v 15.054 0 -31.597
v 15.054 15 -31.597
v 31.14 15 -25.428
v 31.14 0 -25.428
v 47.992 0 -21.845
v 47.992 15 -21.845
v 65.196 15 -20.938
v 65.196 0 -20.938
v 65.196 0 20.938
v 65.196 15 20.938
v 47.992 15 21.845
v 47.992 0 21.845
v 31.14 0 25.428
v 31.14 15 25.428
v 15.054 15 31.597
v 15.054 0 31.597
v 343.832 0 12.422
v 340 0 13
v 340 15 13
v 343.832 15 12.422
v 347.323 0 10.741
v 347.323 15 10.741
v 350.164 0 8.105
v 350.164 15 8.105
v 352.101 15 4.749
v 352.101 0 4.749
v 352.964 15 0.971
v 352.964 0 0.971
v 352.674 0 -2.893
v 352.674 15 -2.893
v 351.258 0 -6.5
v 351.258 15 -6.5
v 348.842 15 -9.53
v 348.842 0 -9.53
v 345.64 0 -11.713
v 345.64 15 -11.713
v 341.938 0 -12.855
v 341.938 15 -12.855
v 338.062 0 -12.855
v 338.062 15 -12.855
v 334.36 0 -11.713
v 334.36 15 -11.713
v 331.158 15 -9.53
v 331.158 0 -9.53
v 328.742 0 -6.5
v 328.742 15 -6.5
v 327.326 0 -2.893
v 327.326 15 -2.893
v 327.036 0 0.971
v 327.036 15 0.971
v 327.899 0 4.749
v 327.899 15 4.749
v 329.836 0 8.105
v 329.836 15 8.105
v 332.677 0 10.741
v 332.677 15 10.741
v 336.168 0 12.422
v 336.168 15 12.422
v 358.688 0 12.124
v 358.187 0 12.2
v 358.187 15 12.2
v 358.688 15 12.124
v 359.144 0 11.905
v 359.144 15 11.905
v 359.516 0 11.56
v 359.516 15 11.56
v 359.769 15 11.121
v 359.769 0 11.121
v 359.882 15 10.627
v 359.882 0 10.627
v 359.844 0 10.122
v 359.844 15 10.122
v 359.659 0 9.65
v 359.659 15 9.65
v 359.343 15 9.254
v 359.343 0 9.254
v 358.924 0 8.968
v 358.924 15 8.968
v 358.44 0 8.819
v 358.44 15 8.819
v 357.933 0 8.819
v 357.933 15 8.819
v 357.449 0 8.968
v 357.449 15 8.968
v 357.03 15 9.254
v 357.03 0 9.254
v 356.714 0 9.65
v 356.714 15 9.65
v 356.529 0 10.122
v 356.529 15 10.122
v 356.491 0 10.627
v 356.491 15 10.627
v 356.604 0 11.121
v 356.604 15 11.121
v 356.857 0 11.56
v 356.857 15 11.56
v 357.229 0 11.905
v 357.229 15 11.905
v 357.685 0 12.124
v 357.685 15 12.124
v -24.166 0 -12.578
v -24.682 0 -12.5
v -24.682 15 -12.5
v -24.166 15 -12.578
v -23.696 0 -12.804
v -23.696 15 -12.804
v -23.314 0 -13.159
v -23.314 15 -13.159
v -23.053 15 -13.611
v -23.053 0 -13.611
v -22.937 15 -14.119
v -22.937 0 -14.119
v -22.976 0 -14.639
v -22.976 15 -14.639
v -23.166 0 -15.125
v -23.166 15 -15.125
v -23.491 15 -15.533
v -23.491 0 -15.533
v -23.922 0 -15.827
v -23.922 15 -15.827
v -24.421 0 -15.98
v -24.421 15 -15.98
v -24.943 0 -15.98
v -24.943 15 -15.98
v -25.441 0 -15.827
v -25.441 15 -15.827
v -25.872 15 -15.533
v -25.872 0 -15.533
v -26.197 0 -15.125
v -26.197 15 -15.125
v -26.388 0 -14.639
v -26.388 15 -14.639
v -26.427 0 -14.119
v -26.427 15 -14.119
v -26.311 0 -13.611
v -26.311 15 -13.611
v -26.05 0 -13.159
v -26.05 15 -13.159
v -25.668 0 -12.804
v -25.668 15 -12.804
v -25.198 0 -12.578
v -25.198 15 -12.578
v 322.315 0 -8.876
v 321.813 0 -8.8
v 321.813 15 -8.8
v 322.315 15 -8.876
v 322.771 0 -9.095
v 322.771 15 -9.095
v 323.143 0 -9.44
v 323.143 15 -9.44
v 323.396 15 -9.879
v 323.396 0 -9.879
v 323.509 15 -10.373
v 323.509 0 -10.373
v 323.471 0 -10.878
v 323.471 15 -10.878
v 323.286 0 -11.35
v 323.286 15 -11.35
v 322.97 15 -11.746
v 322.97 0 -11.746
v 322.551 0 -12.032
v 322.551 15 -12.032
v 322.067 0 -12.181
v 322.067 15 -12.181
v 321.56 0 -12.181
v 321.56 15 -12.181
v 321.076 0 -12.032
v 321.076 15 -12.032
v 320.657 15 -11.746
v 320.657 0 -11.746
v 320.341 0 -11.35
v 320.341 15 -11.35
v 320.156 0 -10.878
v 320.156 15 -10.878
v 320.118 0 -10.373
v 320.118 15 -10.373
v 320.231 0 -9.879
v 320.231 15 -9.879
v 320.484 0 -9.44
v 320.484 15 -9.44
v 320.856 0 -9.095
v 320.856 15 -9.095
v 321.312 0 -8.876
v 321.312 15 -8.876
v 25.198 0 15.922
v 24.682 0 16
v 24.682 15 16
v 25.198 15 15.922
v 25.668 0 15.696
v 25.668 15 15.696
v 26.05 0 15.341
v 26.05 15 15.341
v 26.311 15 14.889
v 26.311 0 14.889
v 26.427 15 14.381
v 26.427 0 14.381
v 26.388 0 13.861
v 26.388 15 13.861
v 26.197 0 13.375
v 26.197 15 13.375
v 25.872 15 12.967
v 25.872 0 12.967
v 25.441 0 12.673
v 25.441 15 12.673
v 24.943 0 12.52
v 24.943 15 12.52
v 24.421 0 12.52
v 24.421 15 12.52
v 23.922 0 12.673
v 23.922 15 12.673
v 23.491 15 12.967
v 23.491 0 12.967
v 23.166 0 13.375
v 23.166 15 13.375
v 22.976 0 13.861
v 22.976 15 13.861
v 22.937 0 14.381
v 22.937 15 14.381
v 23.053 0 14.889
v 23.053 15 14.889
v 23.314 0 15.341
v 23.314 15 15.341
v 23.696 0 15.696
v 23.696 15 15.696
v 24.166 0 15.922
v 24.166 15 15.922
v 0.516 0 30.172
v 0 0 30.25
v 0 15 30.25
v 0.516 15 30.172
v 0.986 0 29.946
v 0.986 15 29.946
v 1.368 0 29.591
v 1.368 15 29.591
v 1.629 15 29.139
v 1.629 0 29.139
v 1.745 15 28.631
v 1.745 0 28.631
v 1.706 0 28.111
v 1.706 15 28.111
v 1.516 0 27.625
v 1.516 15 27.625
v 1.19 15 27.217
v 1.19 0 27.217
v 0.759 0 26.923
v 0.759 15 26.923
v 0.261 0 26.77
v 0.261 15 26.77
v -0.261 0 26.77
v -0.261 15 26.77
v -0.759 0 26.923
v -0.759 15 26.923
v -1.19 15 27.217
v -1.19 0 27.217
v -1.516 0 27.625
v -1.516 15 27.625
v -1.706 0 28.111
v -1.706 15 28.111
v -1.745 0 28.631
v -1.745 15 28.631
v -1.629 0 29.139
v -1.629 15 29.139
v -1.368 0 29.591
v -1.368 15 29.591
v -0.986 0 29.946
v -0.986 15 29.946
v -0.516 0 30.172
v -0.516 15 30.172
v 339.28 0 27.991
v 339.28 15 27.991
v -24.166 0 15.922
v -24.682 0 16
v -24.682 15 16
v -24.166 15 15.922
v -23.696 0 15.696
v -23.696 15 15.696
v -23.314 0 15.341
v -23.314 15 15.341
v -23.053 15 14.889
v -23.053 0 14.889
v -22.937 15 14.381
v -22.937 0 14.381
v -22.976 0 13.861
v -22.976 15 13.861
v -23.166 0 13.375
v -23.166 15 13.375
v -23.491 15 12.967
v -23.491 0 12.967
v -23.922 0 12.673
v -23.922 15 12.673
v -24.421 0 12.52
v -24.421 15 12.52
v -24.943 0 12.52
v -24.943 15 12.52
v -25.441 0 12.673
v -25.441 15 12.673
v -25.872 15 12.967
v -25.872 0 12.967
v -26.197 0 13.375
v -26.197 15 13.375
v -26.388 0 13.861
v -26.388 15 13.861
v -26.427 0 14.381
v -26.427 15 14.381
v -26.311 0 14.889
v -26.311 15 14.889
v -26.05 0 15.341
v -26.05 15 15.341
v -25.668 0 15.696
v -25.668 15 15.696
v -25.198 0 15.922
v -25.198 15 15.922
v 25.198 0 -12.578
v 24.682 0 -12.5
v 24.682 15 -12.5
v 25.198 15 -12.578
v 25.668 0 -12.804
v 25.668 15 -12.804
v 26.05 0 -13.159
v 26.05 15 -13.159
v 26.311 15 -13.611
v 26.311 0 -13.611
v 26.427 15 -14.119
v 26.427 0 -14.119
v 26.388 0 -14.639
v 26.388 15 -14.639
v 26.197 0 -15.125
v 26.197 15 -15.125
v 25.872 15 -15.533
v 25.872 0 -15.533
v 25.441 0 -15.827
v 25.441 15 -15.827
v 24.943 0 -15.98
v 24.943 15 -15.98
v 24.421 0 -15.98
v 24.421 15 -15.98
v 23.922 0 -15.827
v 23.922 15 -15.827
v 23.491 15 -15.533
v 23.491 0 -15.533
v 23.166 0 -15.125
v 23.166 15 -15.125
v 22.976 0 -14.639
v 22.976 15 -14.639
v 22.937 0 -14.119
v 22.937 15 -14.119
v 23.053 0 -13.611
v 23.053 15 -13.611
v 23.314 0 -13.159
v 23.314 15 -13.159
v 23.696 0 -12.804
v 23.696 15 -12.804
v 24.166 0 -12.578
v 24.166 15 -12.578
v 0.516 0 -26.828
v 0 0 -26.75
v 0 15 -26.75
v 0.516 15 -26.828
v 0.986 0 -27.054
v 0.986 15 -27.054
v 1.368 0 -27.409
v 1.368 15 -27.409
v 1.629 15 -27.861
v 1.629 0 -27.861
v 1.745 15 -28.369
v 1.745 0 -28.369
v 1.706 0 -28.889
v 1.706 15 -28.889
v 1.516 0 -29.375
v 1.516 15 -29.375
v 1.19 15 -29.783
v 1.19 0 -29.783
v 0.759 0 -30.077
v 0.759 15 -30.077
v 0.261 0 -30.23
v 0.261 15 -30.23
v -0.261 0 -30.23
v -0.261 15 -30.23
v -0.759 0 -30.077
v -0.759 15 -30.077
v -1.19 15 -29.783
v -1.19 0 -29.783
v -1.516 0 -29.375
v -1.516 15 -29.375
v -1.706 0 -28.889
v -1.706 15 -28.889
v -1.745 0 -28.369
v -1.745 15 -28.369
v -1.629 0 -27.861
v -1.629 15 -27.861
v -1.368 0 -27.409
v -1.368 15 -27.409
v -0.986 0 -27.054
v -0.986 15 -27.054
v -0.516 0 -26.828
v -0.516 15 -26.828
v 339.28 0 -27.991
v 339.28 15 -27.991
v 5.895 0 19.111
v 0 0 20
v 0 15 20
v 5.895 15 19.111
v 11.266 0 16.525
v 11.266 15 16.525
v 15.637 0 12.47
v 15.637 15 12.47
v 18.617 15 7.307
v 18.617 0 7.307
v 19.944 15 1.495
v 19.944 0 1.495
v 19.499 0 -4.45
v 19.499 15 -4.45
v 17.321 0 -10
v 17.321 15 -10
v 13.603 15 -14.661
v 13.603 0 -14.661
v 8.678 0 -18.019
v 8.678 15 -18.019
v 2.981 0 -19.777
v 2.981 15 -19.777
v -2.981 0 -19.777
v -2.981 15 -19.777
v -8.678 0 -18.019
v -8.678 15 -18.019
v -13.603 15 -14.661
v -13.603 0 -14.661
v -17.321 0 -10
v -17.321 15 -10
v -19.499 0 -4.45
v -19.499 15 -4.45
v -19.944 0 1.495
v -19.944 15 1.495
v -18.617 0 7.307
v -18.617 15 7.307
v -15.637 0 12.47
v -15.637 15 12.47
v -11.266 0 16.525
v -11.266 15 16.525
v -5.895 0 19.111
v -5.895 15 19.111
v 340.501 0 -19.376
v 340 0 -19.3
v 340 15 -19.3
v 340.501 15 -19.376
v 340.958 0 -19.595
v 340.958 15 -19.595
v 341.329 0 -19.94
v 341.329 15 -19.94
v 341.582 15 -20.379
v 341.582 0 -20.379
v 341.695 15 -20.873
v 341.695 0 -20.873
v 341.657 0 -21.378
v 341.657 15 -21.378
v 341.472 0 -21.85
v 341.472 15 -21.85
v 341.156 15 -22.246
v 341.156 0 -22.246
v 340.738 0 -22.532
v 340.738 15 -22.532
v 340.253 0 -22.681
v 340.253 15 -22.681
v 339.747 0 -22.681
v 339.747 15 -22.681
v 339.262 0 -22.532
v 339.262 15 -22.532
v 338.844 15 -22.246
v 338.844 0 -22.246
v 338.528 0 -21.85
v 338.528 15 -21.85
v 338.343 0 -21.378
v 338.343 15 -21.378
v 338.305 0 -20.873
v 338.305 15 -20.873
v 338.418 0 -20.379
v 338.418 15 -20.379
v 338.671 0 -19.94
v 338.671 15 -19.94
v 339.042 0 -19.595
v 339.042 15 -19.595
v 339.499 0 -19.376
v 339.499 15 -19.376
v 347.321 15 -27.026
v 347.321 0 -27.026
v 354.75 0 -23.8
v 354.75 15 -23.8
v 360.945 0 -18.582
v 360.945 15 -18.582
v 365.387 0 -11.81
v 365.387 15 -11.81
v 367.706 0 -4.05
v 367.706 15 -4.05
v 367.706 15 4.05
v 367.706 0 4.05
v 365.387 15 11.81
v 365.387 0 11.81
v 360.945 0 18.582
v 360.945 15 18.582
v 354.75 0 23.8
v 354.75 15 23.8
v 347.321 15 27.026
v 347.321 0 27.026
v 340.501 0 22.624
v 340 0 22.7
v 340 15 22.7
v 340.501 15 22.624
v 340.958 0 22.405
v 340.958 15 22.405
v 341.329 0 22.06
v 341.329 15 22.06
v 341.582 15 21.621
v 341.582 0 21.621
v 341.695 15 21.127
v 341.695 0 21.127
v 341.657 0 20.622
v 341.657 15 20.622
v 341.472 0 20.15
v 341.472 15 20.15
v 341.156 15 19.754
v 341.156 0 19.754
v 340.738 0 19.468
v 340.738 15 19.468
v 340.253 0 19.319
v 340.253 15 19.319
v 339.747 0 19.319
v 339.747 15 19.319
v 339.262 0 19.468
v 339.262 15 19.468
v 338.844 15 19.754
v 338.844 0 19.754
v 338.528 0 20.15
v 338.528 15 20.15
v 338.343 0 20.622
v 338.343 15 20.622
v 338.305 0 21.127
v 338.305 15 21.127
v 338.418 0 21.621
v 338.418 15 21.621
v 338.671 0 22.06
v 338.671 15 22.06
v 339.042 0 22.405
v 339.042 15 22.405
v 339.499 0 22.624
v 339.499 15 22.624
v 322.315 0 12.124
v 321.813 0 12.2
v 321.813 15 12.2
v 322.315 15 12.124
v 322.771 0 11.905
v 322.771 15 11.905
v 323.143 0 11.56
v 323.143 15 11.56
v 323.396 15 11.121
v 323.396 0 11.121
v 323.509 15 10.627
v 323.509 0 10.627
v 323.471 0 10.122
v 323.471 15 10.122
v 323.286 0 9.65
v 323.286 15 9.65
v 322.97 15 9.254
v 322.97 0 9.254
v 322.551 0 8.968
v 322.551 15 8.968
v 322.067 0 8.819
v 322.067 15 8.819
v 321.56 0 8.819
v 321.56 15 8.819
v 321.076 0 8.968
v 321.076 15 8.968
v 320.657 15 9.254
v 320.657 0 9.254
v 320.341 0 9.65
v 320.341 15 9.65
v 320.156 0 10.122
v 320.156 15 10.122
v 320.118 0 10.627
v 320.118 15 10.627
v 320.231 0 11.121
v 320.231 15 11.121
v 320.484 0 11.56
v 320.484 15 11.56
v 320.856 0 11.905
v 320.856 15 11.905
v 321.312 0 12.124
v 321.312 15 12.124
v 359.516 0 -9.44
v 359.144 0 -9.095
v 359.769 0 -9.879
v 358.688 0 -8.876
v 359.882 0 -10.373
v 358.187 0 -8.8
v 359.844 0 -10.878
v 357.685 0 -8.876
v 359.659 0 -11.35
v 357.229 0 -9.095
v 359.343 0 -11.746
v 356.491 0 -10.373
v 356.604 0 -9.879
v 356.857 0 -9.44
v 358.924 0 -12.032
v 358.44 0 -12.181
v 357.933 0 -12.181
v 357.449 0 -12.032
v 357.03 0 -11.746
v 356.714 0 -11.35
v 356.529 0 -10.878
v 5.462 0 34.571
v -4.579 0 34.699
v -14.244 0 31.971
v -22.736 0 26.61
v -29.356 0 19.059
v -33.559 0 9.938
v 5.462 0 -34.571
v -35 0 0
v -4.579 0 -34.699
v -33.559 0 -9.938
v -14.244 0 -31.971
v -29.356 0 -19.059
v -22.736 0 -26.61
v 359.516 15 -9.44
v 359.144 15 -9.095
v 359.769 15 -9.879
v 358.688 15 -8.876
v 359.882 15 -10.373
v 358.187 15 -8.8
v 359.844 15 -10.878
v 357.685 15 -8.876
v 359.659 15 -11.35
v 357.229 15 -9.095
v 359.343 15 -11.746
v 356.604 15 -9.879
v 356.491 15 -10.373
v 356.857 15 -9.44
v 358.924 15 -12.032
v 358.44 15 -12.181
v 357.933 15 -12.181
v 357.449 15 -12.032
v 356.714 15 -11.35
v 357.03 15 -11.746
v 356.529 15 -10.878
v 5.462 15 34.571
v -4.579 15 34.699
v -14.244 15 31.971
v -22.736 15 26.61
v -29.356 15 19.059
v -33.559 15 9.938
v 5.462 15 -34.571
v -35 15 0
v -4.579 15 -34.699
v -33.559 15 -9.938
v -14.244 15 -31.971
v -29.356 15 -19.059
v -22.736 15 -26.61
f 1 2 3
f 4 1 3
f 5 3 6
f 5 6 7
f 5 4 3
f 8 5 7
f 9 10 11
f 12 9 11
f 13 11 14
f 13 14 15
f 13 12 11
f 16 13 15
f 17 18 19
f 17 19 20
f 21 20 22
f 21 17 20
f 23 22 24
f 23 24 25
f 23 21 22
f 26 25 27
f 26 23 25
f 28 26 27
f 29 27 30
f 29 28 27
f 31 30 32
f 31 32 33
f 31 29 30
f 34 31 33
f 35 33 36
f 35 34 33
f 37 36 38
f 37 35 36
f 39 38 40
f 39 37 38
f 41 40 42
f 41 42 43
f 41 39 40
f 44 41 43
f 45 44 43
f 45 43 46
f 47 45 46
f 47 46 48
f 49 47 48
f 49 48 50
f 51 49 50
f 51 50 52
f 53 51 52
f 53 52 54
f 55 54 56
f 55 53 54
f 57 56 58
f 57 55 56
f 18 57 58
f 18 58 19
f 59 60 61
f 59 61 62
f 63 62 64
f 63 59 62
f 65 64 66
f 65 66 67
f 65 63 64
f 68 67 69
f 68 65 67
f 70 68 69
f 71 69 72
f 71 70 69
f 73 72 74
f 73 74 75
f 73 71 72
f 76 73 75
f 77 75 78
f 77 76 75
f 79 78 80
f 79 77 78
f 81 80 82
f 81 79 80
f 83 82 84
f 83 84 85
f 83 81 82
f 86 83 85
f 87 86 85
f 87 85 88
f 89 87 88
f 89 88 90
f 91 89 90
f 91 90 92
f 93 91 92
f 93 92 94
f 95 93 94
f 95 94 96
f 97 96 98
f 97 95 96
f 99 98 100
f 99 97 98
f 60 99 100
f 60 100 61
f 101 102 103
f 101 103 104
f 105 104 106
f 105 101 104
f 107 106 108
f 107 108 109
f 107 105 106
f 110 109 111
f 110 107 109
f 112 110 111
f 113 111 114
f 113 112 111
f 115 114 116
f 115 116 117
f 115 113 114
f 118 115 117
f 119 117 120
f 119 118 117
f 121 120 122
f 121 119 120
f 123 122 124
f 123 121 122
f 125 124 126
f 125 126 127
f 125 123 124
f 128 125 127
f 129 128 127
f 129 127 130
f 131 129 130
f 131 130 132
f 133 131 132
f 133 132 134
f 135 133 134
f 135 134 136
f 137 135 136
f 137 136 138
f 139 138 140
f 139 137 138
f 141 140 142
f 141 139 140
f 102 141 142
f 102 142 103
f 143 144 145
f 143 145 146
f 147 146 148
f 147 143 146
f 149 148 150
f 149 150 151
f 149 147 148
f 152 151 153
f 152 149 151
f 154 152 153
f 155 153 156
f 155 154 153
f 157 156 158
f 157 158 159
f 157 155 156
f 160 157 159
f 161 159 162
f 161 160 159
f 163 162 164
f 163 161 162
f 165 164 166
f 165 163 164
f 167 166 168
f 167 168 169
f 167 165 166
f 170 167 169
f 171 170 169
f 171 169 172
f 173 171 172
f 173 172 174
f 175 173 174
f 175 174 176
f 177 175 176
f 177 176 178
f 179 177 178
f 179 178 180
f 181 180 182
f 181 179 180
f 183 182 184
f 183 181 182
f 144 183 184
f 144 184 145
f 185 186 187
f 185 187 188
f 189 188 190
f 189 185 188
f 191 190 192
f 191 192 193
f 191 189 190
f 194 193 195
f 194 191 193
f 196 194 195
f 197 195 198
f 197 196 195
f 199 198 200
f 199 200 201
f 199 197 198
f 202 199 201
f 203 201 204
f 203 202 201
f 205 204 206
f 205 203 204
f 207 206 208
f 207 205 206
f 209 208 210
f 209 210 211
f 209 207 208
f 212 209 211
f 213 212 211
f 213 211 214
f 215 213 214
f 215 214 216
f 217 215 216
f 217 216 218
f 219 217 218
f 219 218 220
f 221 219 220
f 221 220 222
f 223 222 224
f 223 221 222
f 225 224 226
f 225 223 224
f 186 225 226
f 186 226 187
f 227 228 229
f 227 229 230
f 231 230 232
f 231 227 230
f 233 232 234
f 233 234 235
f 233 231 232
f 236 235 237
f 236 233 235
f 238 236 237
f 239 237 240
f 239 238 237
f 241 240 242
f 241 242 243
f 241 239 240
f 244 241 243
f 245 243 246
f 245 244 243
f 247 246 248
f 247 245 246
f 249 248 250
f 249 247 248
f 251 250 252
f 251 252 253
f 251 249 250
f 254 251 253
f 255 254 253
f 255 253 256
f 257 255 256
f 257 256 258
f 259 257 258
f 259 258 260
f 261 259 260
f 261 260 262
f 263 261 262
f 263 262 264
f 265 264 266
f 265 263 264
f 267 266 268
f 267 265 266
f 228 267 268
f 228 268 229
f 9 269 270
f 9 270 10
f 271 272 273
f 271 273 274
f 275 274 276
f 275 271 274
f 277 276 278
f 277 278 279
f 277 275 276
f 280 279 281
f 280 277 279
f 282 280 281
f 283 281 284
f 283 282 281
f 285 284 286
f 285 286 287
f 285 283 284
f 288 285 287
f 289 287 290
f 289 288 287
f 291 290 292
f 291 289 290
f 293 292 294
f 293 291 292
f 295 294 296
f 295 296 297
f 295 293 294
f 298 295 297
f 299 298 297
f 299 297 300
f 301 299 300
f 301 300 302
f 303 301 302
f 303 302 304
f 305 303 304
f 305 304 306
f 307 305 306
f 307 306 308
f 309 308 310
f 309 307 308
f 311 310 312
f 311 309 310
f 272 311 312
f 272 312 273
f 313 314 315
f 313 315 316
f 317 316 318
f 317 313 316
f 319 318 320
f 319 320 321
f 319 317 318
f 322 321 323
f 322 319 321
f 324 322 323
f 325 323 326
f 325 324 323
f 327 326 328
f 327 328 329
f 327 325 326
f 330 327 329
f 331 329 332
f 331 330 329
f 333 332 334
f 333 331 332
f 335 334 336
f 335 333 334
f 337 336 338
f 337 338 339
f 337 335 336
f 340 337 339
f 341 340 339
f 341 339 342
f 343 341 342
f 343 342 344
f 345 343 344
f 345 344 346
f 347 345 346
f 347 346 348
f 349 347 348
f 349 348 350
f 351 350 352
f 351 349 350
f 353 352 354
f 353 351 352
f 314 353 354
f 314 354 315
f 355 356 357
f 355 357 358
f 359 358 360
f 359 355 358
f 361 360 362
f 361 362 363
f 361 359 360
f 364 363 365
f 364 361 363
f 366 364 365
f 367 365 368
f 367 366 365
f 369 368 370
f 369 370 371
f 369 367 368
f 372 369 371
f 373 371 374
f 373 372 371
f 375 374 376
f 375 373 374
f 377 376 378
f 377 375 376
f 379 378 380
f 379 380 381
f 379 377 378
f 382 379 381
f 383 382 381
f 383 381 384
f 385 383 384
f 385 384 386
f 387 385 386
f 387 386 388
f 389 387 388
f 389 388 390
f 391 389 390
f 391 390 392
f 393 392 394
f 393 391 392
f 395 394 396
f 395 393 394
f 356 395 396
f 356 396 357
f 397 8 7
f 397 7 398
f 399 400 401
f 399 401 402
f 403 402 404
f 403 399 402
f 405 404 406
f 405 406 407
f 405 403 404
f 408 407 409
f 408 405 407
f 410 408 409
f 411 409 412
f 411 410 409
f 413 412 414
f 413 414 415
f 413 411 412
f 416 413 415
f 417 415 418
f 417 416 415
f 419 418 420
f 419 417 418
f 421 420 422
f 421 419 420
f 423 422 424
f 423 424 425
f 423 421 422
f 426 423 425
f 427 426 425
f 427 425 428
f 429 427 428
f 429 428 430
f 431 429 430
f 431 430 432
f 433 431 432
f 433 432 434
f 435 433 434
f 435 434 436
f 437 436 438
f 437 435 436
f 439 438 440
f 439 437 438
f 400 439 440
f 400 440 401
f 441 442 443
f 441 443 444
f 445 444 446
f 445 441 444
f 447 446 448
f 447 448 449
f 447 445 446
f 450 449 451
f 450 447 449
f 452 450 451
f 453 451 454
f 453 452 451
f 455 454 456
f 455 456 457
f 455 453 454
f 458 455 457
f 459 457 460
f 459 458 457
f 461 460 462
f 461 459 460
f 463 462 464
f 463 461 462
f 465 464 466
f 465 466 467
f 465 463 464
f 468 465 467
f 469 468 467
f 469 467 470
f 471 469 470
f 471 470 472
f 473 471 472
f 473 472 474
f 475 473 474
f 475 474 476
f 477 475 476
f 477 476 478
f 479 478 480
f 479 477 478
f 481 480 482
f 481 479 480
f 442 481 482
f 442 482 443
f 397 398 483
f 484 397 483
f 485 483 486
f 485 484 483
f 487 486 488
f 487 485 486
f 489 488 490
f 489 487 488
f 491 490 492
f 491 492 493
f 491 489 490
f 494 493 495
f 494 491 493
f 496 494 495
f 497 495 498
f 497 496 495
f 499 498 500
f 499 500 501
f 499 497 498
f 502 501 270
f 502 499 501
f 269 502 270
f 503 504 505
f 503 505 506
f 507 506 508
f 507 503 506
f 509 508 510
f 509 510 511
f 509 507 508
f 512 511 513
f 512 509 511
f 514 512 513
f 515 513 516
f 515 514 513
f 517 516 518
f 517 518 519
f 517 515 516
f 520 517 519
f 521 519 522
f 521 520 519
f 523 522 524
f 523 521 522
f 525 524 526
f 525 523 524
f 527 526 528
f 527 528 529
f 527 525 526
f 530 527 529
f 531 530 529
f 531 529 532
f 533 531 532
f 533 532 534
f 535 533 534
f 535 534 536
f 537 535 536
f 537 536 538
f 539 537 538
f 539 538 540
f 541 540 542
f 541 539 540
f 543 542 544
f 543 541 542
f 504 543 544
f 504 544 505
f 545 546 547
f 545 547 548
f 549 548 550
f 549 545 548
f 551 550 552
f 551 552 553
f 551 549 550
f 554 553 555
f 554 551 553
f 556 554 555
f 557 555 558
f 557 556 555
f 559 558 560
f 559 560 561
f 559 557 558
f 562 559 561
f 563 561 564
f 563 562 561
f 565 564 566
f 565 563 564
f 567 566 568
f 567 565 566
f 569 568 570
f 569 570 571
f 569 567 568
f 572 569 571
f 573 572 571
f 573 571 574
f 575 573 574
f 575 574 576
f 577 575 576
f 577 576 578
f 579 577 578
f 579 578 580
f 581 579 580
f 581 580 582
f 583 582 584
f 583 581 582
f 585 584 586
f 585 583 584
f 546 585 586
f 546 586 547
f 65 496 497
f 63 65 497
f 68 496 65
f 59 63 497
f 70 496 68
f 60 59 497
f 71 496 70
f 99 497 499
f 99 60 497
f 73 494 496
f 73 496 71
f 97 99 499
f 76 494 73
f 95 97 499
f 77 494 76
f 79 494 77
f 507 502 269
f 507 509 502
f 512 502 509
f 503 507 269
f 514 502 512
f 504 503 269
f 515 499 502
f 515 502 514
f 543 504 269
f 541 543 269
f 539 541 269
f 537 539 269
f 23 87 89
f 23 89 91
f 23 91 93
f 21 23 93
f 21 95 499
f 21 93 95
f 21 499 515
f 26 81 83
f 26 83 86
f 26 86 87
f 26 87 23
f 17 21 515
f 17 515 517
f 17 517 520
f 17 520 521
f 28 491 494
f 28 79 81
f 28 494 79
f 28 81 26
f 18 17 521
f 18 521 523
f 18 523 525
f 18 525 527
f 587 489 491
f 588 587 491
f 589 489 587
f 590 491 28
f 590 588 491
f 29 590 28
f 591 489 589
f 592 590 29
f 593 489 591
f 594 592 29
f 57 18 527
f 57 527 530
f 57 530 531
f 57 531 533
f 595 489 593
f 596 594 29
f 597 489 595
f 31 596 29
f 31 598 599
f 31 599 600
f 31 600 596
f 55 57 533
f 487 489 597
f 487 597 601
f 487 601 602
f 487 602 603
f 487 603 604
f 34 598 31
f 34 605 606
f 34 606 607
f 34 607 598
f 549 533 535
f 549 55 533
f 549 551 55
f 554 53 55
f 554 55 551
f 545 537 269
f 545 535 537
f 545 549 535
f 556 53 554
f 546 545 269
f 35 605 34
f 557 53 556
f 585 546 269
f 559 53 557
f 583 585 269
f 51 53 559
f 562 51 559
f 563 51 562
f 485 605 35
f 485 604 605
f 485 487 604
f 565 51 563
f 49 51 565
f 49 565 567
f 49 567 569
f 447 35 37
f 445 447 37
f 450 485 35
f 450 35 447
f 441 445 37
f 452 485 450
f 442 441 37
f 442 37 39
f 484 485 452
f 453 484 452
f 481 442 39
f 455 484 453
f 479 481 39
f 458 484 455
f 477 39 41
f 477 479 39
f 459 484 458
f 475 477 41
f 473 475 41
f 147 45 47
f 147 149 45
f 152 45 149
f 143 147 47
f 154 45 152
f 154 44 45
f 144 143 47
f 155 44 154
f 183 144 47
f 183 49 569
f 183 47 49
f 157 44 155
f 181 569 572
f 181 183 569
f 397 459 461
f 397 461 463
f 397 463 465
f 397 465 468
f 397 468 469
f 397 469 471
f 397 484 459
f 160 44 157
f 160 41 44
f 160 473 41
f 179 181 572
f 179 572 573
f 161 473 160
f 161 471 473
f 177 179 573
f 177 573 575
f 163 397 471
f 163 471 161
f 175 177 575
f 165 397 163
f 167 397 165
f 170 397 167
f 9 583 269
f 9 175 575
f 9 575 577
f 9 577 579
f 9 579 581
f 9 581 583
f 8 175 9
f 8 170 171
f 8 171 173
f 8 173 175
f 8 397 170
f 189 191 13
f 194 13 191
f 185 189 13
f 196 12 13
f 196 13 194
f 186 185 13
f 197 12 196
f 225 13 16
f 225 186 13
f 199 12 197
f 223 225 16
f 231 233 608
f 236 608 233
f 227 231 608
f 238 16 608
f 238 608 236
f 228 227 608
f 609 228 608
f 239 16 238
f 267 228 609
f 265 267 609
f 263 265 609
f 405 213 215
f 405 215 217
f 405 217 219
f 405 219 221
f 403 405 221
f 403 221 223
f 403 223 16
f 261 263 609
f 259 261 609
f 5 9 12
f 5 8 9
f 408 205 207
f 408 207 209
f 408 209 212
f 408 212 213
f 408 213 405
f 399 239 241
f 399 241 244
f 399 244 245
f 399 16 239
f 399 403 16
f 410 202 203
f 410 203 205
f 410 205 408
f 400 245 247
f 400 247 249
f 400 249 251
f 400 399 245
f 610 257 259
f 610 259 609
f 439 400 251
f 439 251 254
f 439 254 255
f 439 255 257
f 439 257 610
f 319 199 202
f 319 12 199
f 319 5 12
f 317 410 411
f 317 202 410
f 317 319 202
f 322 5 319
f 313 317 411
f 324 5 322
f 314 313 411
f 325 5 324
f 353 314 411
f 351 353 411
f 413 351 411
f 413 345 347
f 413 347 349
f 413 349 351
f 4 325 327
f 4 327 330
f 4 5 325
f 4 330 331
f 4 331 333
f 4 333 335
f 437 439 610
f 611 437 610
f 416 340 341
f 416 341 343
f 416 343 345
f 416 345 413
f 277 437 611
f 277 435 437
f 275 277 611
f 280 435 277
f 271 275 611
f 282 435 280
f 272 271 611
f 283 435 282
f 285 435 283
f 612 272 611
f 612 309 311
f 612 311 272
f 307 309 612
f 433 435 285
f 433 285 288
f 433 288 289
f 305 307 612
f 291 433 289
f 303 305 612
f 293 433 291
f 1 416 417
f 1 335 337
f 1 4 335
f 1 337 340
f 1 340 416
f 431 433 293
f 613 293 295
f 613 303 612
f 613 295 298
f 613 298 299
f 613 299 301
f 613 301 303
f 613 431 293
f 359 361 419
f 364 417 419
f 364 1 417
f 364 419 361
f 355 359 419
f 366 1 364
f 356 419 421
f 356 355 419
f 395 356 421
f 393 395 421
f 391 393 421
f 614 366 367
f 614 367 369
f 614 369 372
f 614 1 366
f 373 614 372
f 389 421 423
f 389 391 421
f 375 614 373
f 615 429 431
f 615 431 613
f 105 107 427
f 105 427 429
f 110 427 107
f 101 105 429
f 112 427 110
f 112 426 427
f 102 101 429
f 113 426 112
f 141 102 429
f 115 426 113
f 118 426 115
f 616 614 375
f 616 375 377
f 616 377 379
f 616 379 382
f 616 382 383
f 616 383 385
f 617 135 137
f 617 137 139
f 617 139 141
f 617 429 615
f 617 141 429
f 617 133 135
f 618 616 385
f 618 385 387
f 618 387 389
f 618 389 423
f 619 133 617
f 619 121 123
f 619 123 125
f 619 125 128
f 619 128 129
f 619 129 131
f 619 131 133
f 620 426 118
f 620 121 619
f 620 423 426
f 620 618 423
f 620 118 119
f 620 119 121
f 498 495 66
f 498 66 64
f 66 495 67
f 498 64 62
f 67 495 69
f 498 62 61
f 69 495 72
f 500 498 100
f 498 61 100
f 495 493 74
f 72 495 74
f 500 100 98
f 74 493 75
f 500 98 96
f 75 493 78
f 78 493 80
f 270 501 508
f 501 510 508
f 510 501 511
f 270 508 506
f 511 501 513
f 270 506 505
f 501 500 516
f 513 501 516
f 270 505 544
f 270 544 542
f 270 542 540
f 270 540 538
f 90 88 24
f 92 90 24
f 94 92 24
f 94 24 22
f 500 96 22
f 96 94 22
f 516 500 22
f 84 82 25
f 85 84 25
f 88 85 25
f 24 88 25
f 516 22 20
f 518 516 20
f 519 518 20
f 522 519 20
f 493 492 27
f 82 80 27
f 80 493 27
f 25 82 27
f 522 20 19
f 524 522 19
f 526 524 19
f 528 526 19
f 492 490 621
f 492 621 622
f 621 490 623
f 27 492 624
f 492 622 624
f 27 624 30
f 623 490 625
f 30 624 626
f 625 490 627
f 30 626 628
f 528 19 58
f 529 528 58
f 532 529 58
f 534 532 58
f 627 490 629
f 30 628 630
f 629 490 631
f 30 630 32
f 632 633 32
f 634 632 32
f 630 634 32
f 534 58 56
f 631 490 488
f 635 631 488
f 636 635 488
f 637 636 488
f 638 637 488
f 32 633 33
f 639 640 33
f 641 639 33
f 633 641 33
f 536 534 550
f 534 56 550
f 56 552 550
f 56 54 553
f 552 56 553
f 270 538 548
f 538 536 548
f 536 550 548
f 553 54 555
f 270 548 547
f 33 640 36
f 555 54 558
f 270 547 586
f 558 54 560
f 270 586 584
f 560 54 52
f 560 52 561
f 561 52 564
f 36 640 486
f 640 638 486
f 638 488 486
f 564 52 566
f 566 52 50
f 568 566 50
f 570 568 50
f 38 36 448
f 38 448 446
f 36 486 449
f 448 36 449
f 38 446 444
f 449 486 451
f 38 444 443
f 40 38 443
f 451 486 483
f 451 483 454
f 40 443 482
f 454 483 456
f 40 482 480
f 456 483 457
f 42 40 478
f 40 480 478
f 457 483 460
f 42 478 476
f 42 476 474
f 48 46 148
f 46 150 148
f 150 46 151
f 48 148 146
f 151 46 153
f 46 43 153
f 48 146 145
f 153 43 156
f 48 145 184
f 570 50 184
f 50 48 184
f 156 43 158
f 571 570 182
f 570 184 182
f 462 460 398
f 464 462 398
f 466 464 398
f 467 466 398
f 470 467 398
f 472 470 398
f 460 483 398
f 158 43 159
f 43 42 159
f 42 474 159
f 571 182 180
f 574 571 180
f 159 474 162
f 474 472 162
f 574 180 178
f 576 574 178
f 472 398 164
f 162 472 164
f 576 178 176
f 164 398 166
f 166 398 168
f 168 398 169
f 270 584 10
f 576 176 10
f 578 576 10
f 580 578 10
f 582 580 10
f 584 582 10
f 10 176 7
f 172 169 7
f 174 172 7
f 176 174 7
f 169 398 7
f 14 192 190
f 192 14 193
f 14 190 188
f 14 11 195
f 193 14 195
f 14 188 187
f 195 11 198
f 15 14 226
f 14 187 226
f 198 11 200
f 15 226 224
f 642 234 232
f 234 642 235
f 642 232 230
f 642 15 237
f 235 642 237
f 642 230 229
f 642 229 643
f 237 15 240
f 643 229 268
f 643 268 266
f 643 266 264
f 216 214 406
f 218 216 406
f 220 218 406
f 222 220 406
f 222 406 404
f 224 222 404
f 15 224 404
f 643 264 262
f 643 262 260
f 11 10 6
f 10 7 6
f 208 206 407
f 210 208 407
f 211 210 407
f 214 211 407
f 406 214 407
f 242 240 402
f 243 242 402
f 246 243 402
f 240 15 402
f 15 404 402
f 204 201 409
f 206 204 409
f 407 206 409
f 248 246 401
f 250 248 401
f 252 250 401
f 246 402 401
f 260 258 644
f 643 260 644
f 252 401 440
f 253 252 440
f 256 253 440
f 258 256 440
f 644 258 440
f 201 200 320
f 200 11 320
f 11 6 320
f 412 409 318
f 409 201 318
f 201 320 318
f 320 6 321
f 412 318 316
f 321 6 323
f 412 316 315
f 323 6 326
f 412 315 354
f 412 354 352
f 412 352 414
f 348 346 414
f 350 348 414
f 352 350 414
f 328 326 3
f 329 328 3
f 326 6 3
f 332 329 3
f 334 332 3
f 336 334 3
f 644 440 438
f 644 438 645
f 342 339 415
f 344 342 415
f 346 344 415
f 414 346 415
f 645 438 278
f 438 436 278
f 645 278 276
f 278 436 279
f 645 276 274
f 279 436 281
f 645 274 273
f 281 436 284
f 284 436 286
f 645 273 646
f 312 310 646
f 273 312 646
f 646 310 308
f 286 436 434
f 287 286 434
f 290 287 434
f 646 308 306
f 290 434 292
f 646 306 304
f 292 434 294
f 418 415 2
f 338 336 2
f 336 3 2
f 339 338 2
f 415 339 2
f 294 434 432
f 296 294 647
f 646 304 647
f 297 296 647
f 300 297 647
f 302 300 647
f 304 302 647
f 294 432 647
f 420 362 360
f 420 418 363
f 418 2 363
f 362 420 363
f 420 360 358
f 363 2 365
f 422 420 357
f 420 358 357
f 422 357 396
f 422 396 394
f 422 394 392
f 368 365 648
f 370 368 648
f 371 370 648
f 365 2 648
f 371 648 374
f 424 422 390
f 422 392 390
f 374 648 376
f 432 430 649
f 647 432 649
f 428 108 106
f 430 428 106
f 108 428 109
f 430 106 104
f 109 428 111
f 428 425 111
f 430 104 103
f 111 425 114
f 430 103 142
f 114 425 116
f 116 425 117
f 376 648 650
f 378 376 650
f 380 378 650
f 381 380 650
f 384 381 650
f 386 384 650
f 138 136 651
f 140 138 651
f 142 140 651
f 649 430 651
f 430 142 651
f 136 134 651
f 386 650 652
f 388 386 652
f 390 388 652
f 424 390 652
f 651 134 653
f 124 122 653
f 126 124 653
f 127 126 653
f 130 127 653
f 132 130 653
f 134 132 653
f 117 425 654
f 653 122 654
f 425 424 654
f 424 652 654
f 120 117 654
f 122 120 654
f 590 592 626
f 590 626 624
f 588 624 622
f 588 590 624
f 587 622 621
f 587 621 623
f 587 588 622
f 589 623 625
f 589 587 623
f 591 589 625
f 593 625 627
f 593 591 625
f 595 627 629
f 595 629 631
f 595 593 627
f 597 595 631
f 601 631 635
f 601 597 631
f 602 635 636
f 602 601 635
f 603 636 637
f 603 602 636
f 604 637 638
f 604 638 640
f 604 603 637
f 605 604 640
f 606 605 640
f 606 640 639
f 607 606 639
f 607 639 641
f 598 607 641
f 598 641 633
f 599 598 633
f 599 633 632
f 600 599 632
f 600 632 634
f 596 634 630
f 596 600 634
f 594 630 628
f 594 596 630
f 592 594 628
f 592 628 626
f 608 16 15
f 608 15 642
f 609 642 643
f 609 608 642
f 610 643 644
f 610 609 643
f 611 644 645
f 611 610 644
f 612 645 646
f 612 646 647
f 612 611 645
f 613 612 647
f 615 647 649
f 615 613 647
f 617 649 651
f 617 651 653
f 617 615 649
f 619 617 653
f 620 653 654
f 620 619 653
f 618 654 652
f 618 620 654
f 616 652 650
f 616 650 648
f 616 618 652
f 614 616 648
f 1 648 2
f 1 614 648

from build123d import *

# Parameters (mm, degrees)
SKETCH_1_R      = 20
SKETCH_1_R_2    = 13
SKETCH_1_R_3    = 1.7
SKETCH_1_R_4    = 1.75
EXTRUDE_1_DEPTH = 15


with BuildPart() as part:
    # 草图1 → 凸台-拉伸1 (new body)
    with BuildSketch(Plane(origin=(0, 0, 0), x_dir=(1, 0, 0), z_dir=(0, 1, 0))):
        with BuildLine():
            Line((65.196415688, 20.938478113), (339.27978891, 27.990735896))
            ThreePointArc((339.27978891, 27.990735896), (368, 0), (339.27978891, -27.990735896))
            Line((339.27978891, -27.990735896), (65.196415688, -20.938478113))
            ThreePointArc((65.196415688, -20.938478113), (39.495702891, -23.306065445), (15.054107063, -31.597054618))
            ThreePointArc((15.054107063, -31.597054618), (-35, 0), (15.054107063, 31.597054618))
            ThreePointArc((15.054107063, 31.597054618), (39.495702891, 23.306065445), (65.196415688, 20.938478113))
        make_face()
        with Locations(Location((0, 0, 0), (0, 0, 270))):
            Circle(SKETCH_1_R, mode=Mode.SUBTRACT)
        with Locations(Location((340, 0, 0), (0, 0, 270))):
            Circle(SKETCH_1_R_2, mode=Mode.SUBTRACT)
        with Locations(Location((340, 21, 0), (0, 0, 270))):
            Circle(SKETCH_1_R_3, mode=Mode.SUBTRACT)
        with Locations(Location((358.186533479, 10.5, 0), (0, 0, 270))):
            Circle(SKETCH_1_R_3, mode=Mode.SUBTRACT)
        with Locations(Location((358.186533479, -10.5, 0), (0, 0, 270))):
            Circle(SKETCH_1_R_3, mode=Mode.SUBTRACT)
        with Locations(Location((340, -21, 0), (0, 0, 270))):
            Circle(SKETCH_1_R_3, mode=Mode.SUBTRACT)
        with Locations(Location((321.813466521, -10.5, 0), (0, 0, 270))):
            Circle(SKETCH_1_R_3, mode=Mode.SUBTRACT)
        with Locations(Location((321.813466521, 10.5, 0), (0, 0, 270))):
            Circle(SKETCH_1_R_3, mode=Mode.SUBTRACT)
        with Locations(Location((0, 28.5, 0), (0, 0, 270))):
            Circle(SKETCH_1_R_4, mode=Mode.SUBTRACT)
        with Locations(Location((-24.681724008, 14.25, 0), (0, 0, 270))):
            Circle(SKETCH_1_R_4, mode=Mode.SUBTRACT)
        with Locations(Location((-24.681724008, -14.25, 0), (0, 0, 270))):
            Circle(SKETCH_1_R_4, mode=Mode.SUBTRACT)
        with Locations(Location((0, -28.5, 0), (0, 0, 270))):
            Circle(SKETCH_1_R_4, mode=Mode.SUBTRACT)
        with Locations(Location((24.681724008, -14.25, 0), (0, 0, 270))):
            Circle(SKETCH_1_R_4, mode=Mode.SUBTRACT)
        with Locations(Location((24.681724008, 14.25, 0), (0, 0, 270))):
            Circle(SKETCH_1_R_4, mode=Mode.SUBTRACT)
    extrude(amount=EXTRUDE_1_DEPTH)


solid = part.part
